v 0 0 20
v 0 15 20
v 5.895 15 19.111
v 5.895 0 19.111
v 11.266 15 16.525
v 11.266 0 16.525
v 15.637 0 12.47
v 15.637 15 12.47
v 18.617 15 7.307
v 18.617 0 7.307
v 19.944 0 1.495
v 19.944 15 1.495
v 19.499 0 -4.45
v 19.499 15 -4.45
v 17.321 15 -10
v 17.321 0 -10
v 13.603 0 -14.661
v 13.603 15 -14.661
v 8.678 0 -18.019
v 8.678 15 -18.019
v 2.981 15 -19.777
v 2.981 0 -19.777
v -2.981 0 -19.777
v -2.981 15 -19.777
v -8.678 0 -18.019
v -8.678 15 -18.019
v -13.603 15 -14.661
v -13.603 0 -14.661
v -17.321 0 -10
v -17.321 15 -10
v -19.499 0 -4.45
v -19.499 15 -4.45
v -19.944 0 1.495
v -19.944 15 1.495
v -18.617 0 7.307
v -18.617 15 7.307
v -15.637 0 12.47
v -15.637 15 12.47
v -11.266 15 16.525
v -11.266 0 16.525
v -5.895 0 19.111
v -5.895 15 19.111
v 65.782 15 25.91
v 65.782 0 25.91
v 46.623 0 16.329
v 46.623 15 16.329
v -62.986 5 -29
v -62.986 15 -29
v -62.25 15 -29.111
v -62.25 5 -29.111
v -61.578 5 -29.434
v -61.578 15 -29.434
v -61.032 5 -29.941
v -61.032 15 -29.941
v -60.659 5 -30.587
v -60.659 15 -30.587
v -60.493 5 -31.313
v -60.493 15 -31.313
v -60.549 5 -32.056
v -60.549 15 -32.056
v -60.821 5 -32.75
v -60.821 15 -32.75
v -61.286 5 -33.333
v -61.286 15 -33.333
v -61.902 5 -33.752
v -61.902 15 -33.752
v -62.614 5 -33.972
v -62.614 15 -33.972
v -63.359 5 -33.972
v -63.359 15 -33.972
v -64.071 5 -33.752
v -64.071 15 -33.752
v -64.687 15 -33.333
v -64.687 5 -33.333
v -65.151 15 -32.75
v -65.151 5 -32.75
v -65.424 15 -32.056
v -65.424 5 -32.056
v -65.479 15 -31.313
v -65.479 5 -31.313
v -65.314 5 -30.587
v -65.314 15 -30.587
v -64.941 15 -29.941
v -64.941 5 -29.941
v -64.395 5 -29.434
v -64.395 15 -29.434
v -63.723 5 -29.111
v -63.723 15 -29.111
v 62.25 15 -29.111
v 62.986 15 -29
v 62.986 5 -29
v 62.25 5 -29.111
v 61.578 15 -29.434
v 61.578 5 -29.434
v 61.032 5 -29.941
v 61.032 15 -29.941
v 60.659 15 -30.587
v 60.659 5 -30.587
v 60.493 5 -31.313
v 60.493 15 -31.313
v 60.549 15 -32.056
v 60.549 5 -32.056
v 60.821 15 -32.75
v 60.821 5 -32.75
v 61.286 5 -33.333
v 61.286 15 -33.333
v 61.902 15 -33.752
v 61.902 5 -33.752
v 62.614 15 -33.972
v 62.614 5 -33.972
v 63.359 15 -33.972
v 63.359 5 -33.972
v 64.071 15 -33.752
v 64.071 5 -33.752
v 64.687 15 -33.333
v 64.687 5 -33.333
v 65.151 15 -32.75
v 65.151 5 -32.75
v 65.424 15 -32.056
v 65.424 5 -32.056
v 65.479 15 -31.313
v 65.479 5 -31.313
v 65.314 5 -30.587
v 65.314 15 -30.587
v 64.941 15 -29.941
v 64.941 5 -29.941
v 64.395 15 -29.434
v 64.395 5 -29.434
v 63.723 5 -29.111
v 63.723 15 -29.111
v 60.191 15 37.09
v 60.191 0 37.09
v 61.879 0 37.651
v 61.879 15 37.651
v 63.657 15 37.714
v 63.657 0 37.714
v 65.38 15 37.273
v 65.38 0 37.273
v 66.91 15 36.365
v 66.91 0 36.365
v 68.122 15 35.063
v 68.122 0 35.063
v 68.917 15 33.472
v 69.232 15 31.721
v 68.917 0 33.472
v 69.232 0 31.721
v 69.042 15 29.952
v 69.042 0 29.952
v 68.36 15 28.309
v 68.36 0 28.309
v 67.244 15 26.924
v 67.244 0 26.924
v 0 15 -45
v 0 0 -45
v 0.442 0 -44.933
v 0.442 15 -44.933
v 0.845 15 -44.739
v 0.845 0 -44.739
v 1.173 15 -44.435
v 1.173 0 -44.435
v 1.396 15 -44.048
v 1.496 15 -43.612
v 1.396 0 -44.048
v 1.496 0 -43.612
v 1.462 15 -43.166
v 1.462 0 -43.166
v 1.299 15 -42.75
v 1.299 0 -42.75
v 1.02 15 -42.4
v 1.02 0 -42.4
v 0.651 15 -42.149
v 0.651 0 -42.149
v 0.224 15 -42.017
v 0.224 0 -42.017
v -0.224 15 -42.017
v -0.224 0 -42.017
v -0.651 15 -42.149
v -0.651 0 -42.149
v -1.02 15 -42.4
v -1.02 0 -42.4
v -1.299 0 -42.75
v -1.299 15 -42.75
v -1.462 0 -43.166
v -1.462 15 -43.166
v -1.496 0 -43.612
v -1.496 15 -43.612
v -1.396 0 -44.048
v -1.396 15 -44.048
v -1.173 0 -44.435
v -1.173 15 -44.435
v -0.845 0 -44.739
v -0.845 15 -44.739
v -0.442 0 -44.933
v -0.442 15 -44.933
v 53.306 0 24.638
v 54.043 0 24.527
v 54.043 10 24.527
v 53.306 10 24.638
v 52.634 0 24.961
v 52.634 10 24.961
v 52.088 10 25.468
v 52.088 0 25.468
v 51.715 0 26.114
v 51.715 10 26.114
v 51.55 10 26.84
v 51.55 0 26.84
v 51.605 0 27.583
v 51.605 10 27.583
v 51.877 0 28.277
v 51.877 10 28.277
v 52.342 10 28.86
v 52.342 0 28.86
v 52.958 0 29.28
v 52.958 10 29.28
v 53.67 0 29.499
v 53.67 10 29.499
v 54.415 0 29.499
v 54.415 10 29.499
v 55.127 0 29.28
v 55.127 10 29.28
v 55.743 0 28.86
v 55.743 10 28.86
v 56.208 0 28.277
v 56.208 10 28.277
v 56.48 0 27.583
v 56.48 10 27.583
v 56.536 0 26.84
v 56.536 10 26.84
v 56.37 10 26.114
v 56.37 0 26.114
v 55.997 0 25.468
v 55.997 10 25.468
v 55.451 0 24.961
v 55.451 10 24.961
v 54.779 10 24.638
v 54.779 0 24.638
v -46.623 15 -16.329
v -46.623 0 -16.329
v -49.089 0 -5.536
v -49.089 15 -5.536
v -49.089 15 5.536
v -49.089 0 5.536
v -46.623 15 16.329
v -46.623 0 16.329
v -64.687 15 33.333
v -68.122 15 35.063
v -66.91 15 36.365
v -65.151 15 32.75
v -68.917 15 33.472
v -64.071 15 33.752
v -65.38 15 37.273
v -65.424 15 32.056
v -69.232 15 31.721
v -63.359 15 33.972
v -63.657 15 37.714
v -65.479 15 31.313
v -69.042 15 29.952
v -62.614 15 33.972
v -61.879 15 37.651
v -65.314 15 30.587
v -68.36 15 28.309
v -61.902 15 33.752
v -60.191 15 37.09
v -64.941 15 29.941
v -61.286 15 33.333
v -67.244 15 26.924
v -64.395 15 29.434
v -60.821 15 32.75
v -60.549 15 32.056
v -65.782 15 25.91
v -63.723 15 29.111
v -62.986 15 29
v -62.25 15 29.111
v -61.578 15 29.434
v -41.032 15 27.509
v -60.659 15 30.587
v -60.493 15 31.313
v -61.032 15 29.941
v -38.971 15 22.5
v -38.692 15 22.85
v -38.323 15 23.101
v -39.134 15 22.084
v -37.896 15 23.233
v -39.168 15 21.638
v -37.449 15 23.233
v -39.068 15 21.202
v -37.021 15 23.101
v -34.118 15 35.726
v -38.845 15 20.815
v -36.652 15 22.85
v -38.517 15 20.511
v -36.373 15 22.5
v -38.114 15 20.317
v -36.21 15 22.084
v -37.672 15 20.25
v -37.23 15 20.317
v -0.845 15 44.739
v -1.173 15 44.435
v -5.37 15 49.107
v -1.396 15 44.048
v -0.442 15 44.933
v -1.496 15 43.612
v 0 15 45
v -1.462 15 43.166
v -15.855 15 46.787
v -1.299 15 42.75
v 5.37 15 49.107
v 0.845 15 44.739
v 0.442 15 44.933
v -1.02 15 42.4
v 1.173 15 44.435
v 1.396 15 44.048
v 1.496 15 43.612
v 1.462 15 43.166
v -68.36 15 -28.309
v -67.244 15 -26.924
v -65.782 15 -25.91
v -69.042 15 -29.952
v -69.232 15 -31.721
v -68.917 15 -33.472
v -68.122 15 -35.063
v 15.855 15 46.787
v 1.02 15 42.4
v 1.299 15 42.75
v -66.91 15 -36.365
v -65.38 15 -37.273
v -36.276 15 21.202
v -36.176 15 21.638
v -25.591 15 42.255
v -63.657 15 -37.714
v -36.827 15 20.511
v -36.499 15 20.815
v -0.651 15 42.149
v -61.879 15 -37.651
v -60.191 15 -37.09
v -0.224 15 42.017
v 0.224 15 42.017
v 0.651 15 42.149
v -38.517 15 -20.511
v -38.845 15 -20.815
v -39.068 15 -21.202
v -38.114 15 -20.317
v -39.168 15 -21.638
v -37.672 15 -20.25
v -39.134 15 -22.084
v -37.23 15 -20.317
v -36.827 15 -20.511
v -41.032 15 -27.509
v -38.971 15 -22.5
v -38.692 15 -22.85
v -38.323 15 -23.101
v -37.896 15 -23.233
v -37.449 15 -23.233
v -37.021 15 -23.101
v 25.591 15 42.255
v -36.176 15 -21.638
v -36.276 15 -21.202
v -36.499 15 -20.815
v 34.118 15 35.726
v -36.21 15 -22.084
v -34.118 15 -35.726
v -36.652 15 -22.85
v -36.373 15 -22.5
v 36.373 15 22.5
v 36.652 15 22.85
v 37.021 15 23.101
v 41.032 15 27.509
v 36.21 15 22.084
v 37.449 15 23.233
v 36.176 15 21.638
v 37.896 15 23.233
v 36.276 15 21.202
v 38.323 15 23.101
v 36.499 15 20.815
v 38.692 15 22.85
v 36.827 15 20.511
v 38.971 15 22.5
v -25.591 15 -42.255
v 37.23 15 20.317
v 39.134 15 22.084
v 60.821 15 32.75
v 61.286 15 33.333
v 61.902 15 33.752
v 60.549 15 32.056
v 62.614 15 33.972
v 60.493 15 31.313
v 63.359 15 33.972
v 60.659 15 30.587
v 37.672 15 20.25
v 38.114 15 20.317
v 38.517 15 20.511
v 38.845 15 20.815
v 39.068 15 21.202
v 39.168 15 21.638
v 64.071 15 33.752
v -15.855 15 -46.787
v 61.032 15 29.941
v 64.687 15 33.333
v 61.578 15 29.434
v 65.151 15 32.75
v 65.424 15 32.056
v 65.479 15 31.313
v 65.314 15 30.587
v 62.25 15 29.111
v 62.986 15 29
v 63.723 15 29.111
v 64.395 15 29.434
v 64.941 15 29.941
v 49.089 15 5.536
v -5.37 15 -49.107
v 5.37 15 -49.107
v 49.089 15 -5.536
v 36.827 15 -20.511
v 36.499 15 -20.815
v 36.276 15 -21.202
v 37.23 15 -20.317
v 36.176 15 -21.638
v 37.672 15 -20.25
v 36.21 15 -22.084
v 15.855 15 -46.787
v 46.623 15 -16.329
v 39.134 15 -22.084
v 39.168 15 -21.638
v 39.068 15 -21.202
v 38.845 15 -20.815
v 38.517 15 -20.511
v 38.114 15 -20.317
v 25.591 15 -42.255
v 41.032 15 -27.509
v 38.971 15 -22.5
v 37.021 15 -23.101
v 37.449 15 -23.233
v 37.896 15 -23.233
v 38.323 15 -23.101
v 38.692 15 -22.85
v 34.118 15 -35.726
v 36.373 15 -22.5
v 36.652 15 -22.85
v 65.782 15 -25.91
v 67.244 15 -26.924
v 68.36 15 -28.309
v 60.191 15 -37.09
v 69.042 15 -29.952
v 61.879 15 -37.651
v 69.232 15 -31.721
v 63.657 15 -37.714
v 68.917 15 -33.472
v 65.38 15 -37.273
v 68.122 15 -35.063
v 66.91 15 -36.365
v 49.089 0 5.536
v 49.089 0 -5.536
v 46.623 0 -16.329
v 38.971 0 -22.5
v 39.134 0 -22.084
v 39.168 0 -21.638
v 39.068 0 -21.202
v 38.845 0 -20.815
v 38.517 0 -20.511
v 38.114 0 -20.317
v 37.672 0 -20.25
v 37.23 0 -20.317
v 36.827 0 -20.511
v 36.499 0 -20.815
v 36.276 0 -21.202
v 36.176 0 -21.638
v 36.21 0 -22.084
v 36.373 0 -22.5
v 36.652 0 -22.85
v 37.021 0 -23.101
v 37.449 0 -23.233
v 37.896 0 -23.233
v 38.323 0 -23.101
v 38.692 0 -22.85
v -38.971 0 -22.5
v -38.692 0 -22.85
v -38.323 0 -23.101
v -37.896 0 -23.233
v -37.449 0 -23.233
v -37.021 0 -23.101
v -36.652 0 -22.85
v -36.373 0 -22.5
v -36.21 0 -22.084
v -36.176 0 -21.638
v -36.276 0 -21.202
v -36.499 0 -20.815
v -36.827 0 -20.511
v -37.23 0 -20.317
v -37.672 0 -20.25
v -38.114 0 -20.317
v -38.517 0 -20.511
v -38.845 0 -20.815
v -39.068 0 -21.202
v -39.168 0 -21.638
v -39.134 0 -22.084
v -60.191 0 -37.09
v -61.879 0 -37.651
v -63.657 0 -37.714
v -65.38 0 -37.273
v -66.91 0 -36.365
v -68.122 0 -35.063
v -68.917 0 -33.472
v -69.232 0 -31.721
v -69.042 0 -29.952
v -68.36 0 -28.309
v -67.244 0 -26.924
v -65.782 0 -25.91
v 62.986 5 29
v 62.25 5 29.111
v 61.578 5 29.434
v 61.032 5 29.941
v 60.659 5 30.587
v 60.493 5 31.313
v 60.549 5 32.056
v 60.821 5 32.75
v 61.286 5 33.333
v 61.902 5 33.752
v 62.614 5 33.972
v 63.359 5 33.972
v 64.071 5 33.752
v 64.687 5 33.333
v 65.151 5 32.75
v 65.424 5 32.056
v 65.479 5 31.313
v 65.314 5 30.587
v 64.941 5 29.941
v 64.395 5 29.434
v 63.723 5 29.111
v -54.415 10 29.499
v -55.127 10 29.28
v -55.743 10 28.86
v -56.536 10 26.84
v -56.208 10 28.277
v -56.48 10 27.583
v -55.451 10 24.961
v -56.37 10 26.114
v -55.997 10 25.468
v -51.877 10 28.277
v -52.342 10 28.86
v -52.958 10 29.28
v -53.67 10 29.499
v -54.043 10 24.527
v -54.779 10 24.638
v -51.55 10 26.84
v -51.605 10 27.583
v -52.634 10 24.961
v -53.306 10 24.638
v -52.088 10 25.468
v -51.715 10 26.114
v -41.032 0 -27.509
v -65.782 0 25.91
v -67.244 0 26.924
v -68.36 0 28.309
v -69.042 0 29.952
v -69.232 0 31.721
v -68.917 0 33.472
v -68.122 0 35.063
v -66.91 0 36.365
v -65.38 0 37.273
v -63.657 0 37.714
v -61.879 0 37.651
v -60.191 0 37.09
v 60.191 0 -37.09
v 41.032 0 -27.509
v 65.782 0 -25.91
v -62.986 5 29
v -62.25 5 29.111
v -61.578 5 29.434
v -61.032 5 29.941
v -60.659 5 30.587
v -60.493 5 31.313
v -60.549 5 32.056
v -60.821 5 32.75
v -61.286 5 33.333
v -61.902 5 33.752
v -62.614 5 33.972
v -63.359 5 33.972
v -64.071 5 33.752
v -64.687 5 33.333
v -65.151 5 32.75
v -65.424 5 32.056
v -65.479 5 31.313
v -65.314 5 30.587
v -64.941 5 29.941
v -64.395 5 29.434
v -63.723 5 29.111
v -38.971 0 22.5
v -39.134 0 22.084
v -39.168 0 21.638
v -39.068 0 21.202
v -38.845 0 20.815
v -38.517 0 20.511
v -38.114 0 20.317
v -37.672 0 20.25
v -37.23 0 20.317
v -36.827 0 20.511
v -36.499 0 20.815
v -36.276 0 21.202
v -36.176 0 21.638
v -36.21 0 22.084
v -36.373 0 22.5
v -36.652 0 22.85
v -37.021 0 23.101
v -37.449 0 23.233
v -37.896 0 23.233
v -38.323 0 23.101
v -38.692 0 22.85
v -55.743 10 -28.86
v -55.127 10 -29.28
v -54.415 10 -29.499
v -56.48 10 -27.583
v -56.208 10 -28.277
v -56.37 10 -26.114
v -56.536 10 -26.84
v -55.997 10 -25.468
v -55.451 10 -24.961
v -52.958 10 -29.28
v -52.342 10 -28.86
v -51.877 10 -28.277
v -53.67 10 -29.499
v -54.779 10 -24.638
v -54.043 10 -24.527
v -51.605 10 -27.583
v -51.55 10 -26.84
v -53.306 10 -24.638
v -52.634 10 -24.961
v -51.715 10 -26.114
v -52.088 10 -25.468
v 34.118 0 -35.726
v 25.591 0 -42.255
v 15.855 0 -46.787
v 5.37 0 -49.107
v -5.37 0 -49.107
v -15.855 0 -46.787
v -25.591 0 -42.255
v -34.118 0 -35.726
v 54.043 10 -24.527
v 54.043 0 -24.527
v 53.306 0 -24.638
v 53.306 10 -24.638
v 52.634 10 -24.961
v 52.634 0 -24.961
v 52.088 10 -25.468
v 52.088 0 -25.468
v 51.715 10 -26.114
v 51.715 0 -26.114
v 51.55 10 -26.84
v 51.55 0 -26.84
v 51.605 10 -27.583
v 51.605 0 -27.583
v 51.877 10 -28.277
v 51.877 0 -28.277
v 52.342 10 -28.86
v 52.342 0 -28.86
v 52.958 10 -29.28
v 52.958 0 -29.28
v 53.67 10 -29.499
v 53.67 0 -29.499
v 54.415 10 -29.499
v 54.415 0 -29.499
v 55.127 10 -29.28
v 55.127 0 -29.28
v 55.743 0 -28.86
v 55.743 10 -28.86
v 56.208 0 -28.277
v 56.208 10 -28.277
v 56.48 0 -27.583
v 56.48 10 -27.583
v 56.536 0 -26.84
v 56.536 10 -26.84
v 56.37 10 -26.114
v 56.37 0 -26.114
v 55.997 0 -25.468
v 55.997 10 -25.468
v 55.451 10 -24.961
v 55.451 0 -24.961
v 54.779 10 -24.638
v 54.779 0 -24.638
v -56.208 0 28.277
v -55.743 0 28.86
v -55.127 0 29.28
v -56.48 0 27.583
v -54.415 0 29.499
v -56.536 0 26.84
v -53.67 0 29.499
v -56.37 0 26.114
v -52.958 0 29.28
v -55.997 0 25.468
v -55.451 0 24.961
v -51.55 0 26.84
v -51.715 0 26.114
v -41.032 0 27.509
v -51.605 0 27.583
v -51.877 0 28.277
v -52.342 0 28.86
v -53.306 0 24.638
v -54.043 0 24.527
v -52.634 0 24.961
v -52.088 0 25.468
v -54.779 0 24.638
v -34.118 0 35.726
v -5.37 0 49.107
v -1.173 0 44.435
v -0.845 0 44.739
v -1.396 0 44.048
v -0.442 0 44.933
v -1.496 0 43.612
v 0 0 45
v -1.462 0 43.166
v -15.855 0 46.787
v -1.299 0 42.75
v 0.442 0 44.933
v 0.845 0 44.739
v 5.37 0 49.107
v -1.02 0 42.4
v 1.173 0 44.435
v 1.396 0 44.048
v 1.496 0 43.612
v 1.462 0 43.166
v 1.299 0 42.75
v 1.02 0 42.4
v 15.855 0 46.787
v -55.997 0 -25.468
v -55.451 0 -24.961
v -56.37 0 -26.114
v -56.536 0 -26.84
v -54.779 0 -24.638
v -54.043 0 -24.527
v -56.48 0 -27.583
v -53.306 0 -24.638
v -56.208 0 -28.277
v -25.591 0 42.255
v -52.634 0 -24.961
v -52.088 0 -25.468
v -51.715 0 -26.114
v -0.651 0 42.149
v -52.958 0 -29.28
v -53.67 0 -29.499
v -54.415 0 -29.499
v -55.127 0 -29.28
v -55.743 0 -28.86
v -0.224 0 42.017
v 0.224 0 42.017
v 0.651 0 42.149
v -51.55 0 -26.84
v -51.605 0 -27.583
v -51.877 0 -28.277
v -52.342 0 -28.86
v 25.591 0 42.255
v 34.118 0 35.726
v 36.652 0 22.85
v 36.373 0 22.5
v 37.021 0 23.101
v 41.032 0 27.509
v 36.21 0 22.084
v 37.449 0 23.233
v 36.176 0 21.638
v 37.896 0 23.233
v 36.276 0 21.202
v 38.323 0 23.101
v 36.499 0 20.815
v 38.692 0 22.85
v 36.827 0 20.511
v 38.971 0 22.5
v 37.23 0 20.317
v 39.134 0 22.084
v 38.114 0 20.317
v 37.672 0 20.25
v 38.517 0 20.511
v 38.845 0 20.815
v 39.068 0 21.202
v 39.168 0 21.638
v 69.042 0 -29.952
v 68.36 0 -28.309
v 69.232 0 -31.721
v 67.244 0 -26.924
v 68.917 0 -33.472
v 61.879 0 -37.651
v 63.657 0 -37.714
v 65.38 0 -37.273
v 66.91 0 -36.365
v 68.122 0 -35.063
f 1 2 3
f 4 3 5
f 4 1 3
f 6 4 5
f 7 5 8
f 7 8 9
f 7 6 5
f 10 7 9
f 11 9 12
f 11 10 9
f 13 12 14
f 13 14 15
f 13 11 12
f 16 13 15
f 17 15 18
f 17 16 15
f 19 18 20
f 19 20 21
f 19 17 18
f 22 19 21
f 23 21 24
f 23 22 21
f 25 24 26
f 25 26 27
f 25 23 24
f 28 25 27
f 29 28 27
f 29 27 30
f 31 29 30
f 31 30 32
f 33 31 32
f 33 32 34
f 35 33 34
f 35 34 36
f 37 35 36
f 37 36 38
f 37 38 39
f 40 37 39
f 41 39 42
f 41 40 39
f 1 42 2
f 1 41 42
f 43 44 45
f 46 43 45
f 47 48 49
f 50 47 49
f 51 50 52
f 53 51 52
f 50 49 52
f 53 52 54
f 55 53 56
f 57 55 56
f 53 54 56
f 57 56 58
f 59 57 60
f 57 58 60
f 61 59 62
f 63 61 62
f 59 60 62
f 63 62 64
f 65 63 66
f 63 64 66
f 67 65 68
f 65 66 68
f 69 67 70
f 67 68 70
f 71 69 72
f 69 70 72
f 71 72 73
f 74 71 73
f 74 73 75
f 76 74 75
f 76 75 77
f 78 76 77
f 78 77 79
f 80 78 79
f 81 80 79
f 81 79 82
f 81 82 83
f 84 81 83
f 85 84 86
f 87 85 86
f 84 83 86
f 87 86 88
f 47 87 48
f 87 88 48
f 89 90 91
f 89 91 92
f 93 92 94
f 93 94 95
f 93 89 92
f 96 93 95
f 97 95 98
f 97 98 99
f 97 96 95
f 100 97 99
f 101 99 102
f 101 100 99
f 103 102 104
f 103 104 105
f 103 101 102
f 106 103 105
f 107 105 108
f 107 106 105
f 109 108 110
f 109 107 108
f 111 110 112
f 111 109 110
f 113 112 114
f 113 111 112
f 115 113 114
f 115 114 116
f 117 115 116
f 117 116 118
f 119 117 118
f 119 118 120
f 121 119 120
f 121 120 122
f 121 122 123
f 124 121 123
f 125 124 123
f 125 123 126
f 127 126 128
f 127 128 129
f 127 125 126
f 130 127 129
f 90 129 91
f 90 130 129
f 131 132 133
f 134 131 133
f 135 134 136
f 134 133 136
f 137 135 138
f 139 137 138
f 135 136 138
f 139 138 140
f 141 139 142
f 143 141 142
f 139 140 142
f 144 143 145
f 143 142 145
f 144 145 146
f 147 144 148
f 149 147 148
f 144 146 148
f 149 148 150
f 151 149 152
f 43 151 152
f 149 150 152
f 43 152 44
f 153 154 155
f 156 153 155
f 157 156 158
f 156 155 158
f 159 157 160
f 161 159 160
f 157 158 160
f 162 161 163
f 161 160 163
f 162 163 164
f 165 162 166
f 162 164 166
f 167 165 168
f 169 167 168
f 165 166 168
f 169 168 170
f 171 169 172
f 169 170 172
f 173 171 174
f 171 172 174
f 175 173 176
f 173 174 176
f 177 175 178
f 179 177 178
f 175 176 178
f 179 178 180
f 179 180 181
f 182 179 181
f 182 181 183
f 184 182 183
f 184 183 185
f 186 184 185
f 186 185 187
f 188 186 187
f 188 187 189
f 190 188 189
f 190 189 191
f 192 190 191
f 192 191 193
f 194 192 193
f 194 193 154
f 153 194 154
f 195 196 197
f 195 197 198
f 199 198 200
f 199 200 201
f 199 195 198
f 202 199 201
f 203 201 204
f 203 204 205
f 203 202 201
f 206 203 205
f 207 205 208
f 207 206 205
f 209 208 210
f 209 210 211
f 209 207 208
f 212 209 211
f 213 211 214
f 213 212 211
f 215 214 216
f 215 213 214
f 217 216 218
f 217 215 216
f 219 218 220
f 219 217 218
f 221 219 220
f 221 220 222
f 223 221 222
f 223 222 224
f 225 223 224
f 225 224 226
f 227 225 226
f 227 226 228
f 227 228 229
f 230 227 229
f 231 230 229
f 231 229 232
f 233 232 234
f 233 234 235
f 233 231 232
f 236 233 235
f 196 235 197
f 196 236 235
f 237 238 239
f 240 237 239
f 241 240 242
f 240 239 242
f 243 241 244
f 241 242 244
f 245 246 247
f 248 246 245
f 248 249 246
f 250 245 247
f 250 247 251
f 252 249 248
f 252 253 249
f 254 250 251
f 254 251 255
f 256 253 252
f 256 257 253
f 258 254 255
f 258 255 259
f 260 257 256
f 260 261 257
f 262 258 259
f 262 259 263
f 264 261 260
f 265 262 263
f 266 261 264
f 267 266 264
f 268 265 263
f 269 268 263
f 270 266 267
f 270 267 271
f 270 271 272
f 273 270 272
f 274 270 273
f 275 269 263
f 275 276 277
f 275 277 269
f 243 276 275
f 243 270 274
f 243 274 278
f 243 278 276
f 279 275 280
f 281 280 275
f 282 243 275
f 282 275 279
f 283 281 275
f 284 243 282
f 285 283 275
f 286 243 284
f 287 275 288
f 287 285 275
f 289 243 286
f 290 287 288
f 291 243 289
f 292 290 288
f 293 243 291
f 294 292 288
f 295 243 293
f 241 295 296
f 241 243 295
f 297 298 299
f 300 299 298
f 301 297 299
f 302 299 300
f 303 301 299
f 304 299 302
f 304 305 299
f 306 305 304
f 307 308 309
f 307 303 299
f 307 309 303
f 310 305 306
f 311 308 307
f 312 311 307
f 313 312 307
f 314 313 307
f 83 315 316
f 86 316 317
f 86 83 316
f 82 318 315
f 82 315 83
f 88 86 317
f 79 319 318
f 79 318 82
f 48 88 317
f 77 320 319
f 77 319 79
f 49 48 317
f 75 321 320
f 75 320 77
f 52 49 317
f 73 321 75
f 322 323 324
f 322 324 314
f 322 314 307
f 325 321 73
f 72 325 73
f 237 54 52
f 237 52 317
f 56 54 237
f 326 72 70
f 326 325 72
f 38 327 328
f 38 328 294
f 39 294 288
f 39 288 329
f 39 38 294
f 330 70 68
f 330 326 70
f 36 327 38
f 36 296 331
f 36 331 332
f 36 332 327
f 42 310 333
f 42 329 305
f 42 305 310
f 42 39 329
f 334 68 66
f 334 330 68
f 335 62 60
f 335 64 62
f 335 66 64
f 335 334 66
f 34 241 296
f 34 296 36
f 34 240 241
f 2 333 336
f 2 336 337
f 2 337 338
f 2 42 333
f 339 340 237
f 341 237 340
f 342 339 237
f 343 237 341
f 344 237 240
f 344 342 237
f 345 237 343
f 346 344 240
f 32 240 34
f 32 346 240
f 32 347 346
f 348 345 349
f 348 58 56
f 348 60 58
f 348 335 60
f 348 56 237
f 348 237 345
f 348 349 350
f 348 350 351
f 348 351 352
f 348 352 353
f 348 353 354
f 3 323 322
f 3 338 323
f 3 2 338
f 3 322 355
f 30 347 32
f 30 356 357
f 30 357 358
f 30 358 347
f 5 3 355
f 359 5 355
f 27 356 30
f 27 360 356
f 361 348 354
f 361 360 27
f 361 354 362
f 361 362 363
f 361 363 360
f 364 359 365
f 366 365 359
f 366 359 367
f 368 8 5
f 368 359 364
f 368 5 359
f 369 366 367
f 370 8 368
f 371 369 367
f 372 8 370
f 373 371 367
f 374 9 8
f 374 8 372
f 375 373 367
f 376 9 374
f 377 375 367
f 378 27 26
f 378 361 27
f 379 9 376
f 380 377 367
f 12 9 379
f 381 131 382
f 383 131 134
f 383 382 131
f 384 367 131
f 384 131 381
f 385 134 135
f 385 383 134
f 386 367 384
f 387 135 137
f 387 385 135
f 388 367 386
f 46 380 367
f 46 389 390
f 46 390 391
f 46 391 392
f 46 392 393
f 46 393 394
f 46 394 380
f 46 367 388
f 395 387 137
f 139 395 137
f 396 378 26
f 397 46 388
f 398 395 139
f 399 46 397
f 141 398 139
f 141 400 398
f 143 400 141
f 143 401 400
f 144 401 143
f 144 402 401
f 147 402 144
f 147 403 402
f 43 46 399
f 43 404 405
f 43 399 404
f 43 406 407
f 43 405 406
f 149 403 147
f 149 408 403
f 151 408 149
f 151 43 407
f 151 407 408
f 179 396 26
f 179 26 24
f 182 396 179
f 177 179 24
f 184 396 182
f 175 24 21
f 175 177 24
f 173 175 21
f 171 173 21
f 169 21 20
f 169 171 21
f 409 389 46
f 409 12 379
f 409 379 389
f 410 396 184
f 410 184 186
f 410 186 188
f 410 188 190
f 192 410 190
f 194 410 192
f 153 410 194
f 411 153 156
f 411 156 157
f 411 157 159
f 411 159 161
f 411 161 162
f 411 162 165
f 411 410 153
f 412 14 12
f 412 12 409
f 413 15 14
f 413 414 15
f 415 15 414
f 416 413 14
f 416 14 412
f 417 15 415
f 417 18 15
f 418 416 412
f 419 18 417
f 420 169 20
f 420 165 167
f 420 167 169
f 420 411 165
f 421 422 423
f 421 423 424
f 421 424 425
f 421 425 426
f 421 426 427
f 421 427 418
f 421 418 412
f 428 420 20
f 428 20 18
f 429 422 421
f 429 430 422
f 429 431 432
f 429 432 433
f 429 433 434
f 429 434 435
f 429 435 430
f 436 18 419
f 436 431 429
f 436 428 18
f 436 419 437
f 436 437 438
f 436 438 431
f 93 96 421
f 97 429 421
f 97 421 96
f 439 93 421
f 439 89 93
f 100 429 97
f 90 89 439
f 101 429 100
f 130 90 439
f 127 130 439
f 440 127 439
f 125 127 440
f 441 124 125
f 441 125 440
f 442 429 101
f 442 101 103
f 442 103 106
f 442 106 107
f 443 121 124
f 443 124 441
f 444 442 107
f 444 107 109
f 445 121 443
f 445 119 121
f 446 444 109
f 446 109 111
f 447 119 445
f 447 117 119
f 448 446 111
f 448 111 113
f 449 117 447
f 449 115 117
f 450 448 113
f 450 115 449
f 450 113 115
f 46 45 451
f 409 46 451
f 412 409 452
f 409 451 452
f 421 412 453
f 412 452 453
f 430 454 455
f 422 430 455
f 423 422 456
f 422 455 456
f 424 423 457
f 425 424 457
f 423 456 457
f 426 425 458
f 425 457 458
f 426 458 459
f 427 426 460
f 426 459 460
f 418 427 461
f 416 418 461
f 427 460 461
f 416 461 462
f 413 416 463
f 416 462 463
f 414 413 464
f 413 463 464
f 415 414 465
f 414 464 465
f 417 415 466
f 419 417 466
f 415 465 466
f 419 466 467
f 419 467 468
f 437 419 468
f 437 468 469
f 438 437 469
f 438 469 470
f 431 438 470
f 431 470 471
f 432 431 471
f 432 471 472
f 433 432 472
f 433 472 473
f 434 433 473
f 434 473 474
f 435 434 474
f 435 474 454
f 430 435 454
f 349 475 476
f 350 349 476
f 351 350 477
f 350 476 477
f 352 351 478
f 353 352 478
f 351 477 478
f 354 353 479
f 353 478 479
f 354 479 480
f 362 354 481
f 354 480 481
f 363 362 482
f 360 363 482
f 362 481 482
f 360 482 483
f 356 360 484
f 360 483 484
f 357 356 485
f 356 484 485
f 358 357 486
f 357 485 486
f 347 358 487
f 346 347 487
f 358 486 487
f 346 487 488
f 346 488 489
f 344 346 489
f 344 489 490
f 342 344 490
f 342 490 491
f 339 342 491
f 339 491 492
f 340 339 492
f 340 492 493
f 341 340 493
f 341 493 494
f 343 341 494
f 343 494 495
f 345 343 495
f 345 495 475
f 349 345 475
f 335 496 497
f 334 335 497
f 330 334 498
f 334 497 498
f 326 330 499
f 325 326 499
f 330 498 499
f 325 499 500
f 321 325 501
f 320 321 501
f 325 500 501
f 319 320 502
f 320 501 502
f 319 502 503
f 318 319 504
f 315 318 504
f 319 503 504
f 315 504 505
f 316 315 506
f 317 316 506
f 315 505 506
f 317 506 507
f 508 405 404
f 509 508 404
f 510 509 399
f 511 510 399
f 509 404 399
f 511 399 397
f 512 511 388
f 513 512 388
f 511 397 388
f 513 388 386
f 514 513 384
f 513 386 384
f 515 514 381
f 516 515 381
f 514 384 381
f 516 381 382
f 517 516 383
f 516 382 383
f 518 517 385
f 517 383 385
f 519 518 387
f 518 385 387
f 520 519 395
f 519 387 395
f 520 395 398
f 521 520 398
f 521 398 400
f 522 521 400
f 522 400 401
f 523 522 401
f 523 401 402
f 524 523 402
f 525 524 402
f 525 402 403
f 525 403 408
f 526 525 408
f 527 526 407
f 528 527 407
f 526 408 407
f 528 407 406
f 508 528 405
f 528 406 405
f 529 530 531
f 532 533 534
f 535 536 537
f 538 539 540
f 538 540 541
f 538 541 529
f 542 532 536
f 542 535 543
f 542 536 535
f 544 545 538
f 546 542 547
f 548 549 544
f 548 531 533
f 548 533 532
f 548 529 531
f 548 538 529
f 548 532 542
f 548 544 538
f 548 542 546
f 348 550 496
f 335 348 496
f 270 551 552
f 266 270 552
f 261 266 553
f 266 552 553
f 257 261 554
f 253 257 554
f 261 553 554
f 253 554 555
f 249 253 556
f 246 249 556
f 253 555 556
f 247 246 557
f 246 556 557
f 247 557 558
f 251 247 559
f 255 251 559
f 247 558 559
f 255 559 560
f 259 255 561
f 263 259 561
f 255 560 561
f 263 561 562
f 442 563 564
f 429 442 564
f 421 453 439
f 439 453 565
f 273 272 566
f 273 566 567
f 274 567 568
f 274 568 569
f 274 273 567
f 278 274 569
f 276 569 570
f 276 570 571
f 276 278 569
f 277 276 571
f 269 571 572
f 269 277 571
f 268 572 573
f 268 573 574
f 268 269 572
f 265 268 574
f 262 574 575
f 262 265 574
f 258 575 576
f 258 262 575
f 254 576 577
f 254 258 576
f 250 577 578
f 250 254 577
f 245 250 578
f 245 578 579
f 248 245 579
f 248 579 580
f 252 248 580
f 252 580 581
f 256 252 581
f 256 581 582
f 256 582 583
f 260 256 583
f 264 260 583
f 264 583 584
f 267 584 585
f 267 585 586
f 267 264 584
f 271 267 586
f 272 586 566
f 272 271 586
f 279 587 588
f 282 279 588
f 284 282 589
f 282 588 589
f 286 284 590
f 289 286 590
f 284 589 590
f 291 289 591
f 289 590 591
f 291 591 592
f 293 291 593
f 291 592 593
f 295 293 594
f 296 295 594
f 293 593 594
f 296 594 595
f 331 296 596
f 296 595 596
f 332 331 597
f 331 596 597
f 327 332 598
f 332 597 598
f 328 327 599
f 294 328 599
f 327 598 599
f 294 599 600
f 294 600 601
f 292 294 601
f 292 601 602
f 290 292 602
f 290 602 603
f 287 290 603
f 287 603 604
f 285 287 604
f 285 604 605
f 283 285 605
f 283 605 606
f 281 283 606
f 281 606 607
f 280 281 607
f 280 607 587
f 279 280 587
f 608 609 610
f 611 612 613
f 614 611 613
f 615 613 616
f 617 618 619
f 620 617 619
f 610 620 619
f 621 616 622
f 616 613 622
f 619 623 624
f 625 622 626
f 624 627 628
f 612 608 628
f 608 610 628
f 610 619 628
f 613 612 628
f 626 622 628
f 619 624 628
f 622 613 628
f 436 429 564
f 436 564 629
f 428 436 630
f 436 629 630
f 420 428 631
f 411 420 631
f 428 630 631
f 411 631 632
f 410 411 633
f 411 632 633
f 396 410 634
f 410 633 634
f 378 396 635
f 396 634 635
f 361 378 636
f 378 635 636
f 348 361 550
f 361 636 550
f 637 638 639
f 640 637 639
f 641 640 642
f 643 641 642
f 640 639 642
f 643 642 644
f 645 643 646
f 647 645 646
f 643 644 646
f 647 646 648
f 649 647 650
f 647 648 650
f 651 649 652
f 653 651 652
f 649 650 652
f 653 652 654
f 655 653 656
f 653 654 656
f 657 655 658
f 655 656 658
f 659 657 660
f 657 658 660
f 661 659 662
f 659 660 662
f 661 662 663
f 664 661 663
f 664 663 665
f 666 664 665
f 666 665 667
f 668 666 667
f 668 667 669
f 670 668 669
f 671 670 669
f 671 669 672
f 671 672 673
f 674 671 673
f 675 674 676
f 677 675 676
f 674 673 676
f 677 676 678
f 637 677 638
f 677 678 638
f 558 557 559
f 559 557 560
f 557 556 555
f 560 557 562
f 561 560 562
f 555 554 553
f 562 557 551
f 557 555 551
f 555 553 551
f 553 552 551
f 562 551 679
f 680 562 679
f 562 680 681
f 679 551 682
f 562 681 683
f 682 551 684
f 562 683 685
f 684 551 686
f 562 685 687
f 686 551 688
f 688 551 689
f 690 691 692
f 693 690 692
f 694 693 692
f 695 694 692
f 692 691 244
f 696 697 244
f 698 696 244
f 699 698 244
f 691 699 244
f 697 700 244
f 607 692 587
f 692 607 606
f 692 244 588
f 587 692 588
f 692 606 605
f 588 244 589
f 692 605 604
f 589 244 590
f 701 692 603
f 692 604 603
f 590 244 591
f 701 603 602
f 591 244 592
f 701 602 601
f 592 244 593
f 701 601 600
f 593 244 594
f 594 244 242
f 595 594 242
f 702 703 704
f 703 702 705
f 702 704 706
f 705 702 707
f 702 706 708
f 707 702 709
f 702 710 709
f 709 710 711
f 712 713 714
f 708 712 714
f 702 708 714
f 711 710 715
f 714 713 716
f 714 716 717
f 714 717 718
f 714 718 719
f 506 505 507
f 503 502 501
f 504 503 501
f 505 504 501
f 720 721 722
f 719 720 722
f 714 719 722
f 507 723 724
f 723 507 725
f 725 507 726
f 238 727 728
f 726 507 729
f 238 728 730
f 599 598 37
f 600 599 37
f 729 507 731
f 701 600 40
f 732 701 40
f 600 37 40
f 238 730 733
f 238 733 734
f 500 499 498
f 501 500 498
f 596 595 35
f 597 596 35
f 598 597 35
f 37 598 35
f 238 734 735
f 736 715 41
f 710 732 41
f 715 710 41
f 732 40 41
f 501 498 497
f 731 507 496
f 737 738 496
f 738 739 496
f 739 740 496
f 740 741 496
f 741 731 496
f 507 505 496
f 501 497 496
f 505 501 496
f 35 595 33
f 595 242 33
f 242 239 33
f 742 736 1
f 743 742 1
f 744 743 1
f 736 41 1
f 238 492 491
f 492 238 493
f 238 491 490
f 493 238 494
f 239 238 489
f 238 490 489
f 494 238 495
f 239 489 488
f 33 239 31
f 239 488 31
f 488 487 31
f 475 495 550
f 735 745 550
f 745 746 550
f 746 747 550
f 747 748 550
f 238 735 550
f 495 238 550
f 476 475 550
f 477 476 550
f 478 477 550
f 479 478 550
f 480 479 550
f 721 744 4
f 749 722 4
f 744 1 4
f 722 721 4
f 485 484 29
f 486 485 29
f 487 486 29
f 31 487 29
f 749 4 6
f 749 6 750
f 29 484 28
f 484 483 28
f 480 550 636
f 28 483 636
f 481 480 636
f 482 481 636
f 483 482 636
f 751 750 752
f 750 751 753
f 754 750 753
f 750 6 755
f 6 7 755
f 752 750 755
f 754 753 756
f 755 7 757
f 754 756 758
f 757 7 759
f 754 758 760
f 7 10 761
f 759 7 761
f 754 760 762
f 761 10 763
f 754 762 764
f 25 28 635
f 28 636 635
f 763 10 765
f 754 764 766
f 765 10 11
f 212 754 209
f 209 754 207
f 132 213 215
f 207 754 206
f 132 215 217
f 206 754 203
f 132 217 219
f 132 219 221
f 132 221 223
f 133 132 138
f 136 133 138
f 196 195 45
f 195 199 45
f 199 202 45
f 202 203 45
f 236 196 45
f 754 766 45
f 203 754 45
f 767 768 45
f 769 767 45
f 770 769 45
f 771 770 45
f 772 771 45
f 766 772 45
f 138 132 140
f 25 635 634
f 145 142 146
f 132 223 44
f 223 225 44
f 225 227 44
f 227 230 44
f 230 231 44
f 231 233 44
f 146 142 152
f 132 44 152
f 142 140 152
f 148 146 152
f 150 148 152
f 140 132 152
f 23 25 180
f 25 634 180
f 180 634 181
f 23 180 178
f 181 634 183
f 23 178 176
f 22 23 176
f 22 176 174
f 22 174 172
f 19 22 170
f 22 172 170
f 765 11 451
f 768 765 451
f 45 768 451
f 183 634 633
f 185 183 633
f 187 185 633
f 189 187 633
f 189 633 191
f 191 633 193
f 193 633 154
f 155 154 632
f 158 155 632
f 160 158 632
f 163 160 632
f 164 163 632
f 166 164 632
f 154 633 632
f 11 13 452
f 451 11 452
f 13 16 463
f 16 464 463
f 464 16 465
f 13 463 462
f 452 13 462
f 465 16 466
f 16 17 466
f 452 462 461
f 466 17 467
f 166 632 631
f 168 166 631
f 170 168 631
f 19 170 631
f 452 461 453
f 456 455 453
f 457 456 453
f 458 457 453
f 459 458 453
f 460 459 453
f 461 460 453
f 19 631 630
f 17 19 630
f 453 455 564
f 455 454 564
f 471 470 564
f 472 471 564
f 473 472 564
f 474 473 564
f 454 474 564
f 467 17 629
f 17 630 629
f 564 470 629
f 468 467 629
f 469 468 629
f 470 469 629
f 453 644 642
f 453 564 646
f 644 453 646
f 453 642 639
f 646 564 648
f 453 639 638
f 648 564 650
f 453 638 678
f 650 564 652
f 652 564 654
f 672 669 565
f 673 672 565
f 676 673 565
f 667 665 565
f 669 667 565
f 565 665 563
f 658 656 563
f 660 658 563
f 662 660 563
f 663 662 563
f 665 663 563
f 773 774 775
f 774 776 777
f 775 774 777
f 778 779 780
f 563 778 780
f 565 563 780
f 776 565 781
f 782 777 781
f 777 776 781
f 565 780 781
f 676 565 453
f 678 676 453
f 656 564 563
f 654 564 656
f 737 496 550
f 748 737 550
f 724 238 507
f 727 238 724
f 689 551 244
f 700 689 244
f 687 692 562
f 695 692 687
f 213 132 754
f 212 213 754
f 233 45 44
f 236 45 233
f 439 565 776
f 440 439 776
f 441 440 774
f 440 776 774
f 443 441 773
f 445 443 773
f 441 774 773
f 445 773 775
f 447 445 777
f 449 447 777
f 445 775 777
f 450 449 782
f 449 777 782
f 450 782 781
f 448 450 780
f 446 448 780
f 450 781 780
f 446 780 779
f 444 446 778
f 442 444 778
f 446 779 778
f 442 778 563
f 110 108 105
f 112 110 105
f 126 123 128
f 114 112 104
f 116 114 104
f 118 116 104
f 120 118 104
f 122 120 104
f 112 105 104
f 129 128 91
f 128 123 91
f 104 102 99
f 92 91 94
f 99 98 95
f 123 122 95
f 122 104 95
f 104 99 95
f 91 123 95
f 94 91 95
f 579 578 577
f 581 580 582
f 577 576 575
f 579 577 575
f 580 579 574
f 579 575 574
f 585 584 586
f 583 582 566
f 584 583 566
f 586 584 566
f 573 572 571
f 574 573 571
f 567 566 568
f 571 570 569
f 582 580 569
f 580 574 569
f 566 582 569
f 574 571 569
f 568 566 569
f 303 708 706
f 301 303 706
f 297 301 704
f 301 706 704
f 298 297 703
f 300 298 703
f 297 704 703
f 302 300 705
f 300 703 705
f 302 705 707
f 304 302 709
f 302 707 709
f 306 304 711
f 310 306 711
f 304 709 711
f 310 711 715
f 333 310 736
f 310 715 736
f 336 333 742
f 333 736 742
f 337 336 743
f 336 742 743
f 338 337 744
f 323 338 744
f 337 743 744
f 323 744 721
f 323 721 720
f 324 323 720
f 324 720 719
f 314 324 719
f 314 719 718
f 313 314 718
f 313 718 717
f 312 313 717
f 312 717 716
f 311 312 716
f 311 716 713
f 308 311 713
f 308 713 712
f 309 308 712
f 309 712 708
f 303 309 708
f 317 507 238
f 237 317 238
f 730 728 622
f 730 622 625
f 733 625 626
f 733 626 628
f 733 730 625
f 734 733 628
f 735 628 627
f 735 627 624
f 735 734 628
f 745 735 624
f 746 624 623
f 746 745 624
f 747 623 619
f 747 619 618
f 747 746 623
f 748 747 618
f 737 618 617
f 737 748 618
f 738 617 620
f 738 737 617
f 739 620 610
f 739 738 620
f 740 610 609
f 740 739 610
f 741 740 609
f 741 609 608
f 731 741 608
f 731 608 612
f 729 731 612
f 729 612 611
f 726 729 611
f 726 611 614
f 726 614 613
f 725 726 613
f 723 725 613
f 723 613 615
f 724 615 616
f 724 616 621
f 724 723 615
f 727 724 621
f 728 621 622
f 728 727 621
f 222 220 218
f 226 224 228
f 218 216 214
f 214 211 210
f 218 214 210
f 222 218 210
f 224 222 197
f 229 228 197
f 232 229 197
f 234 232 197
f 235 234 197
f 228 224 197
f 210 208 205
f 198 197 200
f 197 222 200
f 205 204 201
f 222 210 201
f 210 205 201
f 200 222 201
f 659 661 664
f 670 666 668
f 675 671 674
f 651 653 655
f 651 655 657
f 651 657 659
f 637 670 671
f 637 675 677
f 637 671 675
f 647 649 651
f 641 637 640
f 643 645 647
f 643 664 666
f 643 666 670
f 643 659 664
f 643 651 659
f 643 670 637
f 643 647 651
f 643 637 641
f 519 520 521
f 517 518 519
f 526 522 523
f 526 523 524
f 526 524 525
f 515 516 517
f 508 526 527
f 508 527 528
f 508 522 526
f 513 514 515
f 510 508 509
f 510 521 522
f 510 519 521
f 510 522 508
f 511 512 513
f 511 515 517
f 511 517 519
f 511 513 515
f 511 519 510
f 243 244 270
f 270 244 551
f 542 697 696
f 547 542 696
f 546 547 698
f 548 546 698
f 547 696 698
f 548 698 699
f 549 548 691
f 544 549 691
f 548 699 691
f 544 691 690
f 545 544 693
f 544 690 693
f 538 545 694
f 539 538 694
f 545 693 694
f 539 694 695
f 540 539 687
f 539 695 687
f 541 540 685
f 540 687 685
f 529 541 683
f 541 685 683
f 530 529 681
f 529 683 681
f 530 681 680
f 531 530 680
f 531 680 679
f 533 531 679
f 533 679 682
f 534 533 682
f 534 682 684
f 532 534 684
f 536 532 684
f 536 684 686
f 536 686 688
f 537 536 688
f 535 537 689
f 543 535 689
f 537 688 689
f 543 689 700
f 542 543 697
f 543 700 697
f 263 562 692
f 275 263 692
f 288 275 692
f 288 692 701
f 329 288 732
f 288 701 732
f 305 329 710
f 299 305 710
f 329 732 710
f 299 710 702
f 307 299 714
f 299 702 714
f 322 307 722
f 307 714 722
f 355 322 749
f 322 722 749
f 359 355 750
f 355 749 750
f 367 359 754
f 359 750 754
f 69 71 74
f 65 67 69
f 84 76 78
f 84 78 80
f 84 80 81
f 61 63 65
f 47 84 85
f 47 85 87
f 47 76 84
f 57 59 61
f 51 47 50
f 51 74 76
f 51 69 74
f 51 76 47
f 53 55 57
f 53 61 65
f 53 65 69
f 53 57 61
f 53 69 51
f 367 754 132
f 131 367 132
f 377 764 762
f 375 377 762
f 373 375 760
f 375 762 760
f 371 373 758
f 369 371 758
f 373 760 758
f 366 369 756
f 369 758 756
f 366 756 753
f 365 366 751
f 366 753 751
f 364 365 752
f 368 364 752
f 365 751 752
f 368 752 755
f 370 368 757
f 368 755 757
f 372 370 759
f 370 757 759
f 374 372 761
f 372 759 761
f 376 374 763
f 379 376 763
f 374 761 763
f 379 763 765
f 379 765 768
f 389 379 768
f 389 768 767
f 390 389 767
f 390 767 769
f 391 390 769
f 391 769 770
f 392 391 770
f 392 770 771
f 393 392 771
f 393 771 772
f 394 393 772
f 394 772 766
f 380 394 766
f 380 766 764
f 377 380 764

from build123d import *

# Parameters (mm, degrees)
SKETCH_1_R               = 20
EXTRUDE_1_DEPTH          = 15
SKETCH_2_R               = 2.5
CUT_EXTRUDE_1_DEPTH      = 10
MIRROR_2_COPY_1_SKETCH_R = 2.5
MIRROR_2_COPY_1_DEPTH    = 10
SKETCH_3_R               = 2.5
CUT_EXTRUDE_2_DEPTH      = 10
MIRROR_4_COPY_1_SKETCH_R = 2.5
MIRROR_4_COPY_1_DEPTH    = 10
SKETCH_4_R               = 1.5
CUT_EXTRUDE_3_DEPTH      = 87.365727496
PATTERN_CIRCULAR_1_COUNT = 6


with BuildPart() as part:
    # 草图1 → 凸台-拉伸1 (new body)
    with BuildSketch(Plane(origin=(0, 0, 0), x_dir=(1, 0, 0), z_dir=(0, 1, 0))):
        with BuildLine():
            Line((46.623322285, 16.328680875), (65.781966365, 25.910071498))
            ThreePointArc((65.781966365, 25.910071498), (68.576327064, 34.295567803), (60.190830759, 37.089928502))
            Line((60.190830759, 37.089928502), (41.03218668, 27.50853788))
            ThreePointArc((41.03218668, 27.50853788), (0, 49.4), (-41.03218668, 27.50853788))
            Line((-41.03218668, 27.50853788), (-60.190830759, 37.089928502))
            ThreePointArc((-60.190830759, 37.089928502), (-68.576327064, 34.295567803), (-65.781966365, 25.910071498))
            Line((-65.781966365, 25.910071498), (-46.623322285, 16.328680875))
            ThreePointArc((-46.623322285, 16.328680875), (-49.4, 0), (-46.623322285, -16.328680875))
            Line((-46.623322285, -16.328680875), (-65.781966365, -25.910071498))
            ThreePointArc((-65.781966365, -25.910071498), (-68.576327064, -34.295567803), (-60.190830759, -37.089928502))
            Line((-60.190830759, -37.089928502), (-41.03218668, -27.50853788))
            ThreePointArc((-41.03218668, -27.50853788), (0, -49.4), (41.03218668, -27.50853788))
            Line((41.03218668, -27.50853788), (60.190830759, -37.089928502))
            ThreePointArc((60.190830759, -37.089928502), (68.576327064, -34.295567803), (65.781966365, -25.910071498))
            Line((65.781966365, -25.910071498), (46.623322285, -16.328680875))
            ThreePointArc((46.623322285, -16.328680875), (49.4, 0), (46.623322285, 16.328680875))
        make_face()
        with Locations(Location((0, 0, 0), (0, 0, 270))):
            Circle(SKETCH_1_R, mode=Mode.SUBTRACT)
    extrude(amount=EXTRUDE_1_DEPTH)

    # 草图2 → 切除-拉伸1 (cut)
    with BuildSketch(Plane(origin=(0, 15, 0), x_dir=(1, 0, 0), z_dir=(0, 1, 0))):
        with Locations(Location((-62.986398562, 31.5, 0), (0, 0, 270))):
            Circle(SKETCH_2_R)
    cut_extrude_1 = extrude(amount=-CUT_EXTRUDE_1_DEPTH, mode=Mode.SUBTRACT)

    # 镜向1: 切除-拉伸1 across plane
    add(cut_extrude_1.mirror(Plane.XY), mode=Mode.SUBTRACT)

    # 镜向2: 切除-拉伸1 across plane
    add(cut_extrude_1.mirror(Plane(origin=(0, 0, 0), x_dir=(0, 0, 1), z_dir=(1, 0, 0))), mode=Mode.SUBTRACT)

    # 镜向2 copy 1 sketch → 镜向2 copy 1 (cut)
    with BuildSketch(Plane(origin=(0, 15, 0), x_dir=(-1, 0, 0), z_dir=(0, 1, 0))):
        with Locations(Location((-62.986398562, 31.5, 0), (0, 0, 270))):
            Circle(MIRROR_2_COPY_1_SKETCH_R)
    extrude(amount=-MIRROR_2_COPY_1_DEPTH, mode=Mode.SUBTRACT)

    # 草图3 → 切除-拉伸2 (cut)
    with BuildSketch(Plane.XZ):
        with Locations(Location((-54.042512958, 27.027091516, 0), (0, 0, 270))):
            Circle(SKETCH_3_R)
    cut_extrude_2 = extrude(amount=-CUT_EXTRUDE_2_DEPTH, mode=Mode.SUBTRACT)

    # 镜向3: 切除-拉伸2 across plane
    add(cut_extrude_2.mirror(Plane(origin=(0, 0, 0), x_dir=(0, 0, 1), z_dir=(1, 0, 0))), mode=Mode.SUBTRACT)

    # 镜向4: 切除-拉伸2 across plane
    add(cut_extrude_2.mirror(Plane.XY), mode=Mode.SUBTRACT)

    # 镜向4 copy 1 sketch → 镜向4 copy 1 (cut)
    with BuildSketch(Plane(origin=(0, 0, 0), x_dir=(-1, 0, 0), z_dir=(0, -1, 0))):
        with Locations(Location((-54.042512958, 27.027091516, 0), (0, 0, 270))):
            Circle(MIRROR_4_COPY_1_SKETCH_R)
    extrude(amount=-MIRROR_4_COPY_1_DEPTH, mode=Mode.SUBTRACT)

    # 草图4 → 切除-拉伸3 (cut, through all)
    with BuildSketch(Plane.XZ):
        with Locations(Location((0, -43.5, 0), (0, 0, 270))):
            Circle(SKETCH_4_R)
    cut_extrude_3 = extrude(amount=-CUT_EXTRUDE_3_DEPTH, mode=Mode.SUBTRACT)

    # 阵列(圆周)1: 切除-拉伸3 ×6 about axis
    pattern_circular_1_axis = Axis((0, 0, 0), (0, 1, 0))
    for i in range(1, PATTERN_CIRCULAR_1_COUNT):
        add(cut_extrude_3.rotate(pattern_circular_1_axis, i * 360 / PATTERN_CIRCULAR_1_COUNT), mode=Mode.SUBTRACT)


solid = part.part
